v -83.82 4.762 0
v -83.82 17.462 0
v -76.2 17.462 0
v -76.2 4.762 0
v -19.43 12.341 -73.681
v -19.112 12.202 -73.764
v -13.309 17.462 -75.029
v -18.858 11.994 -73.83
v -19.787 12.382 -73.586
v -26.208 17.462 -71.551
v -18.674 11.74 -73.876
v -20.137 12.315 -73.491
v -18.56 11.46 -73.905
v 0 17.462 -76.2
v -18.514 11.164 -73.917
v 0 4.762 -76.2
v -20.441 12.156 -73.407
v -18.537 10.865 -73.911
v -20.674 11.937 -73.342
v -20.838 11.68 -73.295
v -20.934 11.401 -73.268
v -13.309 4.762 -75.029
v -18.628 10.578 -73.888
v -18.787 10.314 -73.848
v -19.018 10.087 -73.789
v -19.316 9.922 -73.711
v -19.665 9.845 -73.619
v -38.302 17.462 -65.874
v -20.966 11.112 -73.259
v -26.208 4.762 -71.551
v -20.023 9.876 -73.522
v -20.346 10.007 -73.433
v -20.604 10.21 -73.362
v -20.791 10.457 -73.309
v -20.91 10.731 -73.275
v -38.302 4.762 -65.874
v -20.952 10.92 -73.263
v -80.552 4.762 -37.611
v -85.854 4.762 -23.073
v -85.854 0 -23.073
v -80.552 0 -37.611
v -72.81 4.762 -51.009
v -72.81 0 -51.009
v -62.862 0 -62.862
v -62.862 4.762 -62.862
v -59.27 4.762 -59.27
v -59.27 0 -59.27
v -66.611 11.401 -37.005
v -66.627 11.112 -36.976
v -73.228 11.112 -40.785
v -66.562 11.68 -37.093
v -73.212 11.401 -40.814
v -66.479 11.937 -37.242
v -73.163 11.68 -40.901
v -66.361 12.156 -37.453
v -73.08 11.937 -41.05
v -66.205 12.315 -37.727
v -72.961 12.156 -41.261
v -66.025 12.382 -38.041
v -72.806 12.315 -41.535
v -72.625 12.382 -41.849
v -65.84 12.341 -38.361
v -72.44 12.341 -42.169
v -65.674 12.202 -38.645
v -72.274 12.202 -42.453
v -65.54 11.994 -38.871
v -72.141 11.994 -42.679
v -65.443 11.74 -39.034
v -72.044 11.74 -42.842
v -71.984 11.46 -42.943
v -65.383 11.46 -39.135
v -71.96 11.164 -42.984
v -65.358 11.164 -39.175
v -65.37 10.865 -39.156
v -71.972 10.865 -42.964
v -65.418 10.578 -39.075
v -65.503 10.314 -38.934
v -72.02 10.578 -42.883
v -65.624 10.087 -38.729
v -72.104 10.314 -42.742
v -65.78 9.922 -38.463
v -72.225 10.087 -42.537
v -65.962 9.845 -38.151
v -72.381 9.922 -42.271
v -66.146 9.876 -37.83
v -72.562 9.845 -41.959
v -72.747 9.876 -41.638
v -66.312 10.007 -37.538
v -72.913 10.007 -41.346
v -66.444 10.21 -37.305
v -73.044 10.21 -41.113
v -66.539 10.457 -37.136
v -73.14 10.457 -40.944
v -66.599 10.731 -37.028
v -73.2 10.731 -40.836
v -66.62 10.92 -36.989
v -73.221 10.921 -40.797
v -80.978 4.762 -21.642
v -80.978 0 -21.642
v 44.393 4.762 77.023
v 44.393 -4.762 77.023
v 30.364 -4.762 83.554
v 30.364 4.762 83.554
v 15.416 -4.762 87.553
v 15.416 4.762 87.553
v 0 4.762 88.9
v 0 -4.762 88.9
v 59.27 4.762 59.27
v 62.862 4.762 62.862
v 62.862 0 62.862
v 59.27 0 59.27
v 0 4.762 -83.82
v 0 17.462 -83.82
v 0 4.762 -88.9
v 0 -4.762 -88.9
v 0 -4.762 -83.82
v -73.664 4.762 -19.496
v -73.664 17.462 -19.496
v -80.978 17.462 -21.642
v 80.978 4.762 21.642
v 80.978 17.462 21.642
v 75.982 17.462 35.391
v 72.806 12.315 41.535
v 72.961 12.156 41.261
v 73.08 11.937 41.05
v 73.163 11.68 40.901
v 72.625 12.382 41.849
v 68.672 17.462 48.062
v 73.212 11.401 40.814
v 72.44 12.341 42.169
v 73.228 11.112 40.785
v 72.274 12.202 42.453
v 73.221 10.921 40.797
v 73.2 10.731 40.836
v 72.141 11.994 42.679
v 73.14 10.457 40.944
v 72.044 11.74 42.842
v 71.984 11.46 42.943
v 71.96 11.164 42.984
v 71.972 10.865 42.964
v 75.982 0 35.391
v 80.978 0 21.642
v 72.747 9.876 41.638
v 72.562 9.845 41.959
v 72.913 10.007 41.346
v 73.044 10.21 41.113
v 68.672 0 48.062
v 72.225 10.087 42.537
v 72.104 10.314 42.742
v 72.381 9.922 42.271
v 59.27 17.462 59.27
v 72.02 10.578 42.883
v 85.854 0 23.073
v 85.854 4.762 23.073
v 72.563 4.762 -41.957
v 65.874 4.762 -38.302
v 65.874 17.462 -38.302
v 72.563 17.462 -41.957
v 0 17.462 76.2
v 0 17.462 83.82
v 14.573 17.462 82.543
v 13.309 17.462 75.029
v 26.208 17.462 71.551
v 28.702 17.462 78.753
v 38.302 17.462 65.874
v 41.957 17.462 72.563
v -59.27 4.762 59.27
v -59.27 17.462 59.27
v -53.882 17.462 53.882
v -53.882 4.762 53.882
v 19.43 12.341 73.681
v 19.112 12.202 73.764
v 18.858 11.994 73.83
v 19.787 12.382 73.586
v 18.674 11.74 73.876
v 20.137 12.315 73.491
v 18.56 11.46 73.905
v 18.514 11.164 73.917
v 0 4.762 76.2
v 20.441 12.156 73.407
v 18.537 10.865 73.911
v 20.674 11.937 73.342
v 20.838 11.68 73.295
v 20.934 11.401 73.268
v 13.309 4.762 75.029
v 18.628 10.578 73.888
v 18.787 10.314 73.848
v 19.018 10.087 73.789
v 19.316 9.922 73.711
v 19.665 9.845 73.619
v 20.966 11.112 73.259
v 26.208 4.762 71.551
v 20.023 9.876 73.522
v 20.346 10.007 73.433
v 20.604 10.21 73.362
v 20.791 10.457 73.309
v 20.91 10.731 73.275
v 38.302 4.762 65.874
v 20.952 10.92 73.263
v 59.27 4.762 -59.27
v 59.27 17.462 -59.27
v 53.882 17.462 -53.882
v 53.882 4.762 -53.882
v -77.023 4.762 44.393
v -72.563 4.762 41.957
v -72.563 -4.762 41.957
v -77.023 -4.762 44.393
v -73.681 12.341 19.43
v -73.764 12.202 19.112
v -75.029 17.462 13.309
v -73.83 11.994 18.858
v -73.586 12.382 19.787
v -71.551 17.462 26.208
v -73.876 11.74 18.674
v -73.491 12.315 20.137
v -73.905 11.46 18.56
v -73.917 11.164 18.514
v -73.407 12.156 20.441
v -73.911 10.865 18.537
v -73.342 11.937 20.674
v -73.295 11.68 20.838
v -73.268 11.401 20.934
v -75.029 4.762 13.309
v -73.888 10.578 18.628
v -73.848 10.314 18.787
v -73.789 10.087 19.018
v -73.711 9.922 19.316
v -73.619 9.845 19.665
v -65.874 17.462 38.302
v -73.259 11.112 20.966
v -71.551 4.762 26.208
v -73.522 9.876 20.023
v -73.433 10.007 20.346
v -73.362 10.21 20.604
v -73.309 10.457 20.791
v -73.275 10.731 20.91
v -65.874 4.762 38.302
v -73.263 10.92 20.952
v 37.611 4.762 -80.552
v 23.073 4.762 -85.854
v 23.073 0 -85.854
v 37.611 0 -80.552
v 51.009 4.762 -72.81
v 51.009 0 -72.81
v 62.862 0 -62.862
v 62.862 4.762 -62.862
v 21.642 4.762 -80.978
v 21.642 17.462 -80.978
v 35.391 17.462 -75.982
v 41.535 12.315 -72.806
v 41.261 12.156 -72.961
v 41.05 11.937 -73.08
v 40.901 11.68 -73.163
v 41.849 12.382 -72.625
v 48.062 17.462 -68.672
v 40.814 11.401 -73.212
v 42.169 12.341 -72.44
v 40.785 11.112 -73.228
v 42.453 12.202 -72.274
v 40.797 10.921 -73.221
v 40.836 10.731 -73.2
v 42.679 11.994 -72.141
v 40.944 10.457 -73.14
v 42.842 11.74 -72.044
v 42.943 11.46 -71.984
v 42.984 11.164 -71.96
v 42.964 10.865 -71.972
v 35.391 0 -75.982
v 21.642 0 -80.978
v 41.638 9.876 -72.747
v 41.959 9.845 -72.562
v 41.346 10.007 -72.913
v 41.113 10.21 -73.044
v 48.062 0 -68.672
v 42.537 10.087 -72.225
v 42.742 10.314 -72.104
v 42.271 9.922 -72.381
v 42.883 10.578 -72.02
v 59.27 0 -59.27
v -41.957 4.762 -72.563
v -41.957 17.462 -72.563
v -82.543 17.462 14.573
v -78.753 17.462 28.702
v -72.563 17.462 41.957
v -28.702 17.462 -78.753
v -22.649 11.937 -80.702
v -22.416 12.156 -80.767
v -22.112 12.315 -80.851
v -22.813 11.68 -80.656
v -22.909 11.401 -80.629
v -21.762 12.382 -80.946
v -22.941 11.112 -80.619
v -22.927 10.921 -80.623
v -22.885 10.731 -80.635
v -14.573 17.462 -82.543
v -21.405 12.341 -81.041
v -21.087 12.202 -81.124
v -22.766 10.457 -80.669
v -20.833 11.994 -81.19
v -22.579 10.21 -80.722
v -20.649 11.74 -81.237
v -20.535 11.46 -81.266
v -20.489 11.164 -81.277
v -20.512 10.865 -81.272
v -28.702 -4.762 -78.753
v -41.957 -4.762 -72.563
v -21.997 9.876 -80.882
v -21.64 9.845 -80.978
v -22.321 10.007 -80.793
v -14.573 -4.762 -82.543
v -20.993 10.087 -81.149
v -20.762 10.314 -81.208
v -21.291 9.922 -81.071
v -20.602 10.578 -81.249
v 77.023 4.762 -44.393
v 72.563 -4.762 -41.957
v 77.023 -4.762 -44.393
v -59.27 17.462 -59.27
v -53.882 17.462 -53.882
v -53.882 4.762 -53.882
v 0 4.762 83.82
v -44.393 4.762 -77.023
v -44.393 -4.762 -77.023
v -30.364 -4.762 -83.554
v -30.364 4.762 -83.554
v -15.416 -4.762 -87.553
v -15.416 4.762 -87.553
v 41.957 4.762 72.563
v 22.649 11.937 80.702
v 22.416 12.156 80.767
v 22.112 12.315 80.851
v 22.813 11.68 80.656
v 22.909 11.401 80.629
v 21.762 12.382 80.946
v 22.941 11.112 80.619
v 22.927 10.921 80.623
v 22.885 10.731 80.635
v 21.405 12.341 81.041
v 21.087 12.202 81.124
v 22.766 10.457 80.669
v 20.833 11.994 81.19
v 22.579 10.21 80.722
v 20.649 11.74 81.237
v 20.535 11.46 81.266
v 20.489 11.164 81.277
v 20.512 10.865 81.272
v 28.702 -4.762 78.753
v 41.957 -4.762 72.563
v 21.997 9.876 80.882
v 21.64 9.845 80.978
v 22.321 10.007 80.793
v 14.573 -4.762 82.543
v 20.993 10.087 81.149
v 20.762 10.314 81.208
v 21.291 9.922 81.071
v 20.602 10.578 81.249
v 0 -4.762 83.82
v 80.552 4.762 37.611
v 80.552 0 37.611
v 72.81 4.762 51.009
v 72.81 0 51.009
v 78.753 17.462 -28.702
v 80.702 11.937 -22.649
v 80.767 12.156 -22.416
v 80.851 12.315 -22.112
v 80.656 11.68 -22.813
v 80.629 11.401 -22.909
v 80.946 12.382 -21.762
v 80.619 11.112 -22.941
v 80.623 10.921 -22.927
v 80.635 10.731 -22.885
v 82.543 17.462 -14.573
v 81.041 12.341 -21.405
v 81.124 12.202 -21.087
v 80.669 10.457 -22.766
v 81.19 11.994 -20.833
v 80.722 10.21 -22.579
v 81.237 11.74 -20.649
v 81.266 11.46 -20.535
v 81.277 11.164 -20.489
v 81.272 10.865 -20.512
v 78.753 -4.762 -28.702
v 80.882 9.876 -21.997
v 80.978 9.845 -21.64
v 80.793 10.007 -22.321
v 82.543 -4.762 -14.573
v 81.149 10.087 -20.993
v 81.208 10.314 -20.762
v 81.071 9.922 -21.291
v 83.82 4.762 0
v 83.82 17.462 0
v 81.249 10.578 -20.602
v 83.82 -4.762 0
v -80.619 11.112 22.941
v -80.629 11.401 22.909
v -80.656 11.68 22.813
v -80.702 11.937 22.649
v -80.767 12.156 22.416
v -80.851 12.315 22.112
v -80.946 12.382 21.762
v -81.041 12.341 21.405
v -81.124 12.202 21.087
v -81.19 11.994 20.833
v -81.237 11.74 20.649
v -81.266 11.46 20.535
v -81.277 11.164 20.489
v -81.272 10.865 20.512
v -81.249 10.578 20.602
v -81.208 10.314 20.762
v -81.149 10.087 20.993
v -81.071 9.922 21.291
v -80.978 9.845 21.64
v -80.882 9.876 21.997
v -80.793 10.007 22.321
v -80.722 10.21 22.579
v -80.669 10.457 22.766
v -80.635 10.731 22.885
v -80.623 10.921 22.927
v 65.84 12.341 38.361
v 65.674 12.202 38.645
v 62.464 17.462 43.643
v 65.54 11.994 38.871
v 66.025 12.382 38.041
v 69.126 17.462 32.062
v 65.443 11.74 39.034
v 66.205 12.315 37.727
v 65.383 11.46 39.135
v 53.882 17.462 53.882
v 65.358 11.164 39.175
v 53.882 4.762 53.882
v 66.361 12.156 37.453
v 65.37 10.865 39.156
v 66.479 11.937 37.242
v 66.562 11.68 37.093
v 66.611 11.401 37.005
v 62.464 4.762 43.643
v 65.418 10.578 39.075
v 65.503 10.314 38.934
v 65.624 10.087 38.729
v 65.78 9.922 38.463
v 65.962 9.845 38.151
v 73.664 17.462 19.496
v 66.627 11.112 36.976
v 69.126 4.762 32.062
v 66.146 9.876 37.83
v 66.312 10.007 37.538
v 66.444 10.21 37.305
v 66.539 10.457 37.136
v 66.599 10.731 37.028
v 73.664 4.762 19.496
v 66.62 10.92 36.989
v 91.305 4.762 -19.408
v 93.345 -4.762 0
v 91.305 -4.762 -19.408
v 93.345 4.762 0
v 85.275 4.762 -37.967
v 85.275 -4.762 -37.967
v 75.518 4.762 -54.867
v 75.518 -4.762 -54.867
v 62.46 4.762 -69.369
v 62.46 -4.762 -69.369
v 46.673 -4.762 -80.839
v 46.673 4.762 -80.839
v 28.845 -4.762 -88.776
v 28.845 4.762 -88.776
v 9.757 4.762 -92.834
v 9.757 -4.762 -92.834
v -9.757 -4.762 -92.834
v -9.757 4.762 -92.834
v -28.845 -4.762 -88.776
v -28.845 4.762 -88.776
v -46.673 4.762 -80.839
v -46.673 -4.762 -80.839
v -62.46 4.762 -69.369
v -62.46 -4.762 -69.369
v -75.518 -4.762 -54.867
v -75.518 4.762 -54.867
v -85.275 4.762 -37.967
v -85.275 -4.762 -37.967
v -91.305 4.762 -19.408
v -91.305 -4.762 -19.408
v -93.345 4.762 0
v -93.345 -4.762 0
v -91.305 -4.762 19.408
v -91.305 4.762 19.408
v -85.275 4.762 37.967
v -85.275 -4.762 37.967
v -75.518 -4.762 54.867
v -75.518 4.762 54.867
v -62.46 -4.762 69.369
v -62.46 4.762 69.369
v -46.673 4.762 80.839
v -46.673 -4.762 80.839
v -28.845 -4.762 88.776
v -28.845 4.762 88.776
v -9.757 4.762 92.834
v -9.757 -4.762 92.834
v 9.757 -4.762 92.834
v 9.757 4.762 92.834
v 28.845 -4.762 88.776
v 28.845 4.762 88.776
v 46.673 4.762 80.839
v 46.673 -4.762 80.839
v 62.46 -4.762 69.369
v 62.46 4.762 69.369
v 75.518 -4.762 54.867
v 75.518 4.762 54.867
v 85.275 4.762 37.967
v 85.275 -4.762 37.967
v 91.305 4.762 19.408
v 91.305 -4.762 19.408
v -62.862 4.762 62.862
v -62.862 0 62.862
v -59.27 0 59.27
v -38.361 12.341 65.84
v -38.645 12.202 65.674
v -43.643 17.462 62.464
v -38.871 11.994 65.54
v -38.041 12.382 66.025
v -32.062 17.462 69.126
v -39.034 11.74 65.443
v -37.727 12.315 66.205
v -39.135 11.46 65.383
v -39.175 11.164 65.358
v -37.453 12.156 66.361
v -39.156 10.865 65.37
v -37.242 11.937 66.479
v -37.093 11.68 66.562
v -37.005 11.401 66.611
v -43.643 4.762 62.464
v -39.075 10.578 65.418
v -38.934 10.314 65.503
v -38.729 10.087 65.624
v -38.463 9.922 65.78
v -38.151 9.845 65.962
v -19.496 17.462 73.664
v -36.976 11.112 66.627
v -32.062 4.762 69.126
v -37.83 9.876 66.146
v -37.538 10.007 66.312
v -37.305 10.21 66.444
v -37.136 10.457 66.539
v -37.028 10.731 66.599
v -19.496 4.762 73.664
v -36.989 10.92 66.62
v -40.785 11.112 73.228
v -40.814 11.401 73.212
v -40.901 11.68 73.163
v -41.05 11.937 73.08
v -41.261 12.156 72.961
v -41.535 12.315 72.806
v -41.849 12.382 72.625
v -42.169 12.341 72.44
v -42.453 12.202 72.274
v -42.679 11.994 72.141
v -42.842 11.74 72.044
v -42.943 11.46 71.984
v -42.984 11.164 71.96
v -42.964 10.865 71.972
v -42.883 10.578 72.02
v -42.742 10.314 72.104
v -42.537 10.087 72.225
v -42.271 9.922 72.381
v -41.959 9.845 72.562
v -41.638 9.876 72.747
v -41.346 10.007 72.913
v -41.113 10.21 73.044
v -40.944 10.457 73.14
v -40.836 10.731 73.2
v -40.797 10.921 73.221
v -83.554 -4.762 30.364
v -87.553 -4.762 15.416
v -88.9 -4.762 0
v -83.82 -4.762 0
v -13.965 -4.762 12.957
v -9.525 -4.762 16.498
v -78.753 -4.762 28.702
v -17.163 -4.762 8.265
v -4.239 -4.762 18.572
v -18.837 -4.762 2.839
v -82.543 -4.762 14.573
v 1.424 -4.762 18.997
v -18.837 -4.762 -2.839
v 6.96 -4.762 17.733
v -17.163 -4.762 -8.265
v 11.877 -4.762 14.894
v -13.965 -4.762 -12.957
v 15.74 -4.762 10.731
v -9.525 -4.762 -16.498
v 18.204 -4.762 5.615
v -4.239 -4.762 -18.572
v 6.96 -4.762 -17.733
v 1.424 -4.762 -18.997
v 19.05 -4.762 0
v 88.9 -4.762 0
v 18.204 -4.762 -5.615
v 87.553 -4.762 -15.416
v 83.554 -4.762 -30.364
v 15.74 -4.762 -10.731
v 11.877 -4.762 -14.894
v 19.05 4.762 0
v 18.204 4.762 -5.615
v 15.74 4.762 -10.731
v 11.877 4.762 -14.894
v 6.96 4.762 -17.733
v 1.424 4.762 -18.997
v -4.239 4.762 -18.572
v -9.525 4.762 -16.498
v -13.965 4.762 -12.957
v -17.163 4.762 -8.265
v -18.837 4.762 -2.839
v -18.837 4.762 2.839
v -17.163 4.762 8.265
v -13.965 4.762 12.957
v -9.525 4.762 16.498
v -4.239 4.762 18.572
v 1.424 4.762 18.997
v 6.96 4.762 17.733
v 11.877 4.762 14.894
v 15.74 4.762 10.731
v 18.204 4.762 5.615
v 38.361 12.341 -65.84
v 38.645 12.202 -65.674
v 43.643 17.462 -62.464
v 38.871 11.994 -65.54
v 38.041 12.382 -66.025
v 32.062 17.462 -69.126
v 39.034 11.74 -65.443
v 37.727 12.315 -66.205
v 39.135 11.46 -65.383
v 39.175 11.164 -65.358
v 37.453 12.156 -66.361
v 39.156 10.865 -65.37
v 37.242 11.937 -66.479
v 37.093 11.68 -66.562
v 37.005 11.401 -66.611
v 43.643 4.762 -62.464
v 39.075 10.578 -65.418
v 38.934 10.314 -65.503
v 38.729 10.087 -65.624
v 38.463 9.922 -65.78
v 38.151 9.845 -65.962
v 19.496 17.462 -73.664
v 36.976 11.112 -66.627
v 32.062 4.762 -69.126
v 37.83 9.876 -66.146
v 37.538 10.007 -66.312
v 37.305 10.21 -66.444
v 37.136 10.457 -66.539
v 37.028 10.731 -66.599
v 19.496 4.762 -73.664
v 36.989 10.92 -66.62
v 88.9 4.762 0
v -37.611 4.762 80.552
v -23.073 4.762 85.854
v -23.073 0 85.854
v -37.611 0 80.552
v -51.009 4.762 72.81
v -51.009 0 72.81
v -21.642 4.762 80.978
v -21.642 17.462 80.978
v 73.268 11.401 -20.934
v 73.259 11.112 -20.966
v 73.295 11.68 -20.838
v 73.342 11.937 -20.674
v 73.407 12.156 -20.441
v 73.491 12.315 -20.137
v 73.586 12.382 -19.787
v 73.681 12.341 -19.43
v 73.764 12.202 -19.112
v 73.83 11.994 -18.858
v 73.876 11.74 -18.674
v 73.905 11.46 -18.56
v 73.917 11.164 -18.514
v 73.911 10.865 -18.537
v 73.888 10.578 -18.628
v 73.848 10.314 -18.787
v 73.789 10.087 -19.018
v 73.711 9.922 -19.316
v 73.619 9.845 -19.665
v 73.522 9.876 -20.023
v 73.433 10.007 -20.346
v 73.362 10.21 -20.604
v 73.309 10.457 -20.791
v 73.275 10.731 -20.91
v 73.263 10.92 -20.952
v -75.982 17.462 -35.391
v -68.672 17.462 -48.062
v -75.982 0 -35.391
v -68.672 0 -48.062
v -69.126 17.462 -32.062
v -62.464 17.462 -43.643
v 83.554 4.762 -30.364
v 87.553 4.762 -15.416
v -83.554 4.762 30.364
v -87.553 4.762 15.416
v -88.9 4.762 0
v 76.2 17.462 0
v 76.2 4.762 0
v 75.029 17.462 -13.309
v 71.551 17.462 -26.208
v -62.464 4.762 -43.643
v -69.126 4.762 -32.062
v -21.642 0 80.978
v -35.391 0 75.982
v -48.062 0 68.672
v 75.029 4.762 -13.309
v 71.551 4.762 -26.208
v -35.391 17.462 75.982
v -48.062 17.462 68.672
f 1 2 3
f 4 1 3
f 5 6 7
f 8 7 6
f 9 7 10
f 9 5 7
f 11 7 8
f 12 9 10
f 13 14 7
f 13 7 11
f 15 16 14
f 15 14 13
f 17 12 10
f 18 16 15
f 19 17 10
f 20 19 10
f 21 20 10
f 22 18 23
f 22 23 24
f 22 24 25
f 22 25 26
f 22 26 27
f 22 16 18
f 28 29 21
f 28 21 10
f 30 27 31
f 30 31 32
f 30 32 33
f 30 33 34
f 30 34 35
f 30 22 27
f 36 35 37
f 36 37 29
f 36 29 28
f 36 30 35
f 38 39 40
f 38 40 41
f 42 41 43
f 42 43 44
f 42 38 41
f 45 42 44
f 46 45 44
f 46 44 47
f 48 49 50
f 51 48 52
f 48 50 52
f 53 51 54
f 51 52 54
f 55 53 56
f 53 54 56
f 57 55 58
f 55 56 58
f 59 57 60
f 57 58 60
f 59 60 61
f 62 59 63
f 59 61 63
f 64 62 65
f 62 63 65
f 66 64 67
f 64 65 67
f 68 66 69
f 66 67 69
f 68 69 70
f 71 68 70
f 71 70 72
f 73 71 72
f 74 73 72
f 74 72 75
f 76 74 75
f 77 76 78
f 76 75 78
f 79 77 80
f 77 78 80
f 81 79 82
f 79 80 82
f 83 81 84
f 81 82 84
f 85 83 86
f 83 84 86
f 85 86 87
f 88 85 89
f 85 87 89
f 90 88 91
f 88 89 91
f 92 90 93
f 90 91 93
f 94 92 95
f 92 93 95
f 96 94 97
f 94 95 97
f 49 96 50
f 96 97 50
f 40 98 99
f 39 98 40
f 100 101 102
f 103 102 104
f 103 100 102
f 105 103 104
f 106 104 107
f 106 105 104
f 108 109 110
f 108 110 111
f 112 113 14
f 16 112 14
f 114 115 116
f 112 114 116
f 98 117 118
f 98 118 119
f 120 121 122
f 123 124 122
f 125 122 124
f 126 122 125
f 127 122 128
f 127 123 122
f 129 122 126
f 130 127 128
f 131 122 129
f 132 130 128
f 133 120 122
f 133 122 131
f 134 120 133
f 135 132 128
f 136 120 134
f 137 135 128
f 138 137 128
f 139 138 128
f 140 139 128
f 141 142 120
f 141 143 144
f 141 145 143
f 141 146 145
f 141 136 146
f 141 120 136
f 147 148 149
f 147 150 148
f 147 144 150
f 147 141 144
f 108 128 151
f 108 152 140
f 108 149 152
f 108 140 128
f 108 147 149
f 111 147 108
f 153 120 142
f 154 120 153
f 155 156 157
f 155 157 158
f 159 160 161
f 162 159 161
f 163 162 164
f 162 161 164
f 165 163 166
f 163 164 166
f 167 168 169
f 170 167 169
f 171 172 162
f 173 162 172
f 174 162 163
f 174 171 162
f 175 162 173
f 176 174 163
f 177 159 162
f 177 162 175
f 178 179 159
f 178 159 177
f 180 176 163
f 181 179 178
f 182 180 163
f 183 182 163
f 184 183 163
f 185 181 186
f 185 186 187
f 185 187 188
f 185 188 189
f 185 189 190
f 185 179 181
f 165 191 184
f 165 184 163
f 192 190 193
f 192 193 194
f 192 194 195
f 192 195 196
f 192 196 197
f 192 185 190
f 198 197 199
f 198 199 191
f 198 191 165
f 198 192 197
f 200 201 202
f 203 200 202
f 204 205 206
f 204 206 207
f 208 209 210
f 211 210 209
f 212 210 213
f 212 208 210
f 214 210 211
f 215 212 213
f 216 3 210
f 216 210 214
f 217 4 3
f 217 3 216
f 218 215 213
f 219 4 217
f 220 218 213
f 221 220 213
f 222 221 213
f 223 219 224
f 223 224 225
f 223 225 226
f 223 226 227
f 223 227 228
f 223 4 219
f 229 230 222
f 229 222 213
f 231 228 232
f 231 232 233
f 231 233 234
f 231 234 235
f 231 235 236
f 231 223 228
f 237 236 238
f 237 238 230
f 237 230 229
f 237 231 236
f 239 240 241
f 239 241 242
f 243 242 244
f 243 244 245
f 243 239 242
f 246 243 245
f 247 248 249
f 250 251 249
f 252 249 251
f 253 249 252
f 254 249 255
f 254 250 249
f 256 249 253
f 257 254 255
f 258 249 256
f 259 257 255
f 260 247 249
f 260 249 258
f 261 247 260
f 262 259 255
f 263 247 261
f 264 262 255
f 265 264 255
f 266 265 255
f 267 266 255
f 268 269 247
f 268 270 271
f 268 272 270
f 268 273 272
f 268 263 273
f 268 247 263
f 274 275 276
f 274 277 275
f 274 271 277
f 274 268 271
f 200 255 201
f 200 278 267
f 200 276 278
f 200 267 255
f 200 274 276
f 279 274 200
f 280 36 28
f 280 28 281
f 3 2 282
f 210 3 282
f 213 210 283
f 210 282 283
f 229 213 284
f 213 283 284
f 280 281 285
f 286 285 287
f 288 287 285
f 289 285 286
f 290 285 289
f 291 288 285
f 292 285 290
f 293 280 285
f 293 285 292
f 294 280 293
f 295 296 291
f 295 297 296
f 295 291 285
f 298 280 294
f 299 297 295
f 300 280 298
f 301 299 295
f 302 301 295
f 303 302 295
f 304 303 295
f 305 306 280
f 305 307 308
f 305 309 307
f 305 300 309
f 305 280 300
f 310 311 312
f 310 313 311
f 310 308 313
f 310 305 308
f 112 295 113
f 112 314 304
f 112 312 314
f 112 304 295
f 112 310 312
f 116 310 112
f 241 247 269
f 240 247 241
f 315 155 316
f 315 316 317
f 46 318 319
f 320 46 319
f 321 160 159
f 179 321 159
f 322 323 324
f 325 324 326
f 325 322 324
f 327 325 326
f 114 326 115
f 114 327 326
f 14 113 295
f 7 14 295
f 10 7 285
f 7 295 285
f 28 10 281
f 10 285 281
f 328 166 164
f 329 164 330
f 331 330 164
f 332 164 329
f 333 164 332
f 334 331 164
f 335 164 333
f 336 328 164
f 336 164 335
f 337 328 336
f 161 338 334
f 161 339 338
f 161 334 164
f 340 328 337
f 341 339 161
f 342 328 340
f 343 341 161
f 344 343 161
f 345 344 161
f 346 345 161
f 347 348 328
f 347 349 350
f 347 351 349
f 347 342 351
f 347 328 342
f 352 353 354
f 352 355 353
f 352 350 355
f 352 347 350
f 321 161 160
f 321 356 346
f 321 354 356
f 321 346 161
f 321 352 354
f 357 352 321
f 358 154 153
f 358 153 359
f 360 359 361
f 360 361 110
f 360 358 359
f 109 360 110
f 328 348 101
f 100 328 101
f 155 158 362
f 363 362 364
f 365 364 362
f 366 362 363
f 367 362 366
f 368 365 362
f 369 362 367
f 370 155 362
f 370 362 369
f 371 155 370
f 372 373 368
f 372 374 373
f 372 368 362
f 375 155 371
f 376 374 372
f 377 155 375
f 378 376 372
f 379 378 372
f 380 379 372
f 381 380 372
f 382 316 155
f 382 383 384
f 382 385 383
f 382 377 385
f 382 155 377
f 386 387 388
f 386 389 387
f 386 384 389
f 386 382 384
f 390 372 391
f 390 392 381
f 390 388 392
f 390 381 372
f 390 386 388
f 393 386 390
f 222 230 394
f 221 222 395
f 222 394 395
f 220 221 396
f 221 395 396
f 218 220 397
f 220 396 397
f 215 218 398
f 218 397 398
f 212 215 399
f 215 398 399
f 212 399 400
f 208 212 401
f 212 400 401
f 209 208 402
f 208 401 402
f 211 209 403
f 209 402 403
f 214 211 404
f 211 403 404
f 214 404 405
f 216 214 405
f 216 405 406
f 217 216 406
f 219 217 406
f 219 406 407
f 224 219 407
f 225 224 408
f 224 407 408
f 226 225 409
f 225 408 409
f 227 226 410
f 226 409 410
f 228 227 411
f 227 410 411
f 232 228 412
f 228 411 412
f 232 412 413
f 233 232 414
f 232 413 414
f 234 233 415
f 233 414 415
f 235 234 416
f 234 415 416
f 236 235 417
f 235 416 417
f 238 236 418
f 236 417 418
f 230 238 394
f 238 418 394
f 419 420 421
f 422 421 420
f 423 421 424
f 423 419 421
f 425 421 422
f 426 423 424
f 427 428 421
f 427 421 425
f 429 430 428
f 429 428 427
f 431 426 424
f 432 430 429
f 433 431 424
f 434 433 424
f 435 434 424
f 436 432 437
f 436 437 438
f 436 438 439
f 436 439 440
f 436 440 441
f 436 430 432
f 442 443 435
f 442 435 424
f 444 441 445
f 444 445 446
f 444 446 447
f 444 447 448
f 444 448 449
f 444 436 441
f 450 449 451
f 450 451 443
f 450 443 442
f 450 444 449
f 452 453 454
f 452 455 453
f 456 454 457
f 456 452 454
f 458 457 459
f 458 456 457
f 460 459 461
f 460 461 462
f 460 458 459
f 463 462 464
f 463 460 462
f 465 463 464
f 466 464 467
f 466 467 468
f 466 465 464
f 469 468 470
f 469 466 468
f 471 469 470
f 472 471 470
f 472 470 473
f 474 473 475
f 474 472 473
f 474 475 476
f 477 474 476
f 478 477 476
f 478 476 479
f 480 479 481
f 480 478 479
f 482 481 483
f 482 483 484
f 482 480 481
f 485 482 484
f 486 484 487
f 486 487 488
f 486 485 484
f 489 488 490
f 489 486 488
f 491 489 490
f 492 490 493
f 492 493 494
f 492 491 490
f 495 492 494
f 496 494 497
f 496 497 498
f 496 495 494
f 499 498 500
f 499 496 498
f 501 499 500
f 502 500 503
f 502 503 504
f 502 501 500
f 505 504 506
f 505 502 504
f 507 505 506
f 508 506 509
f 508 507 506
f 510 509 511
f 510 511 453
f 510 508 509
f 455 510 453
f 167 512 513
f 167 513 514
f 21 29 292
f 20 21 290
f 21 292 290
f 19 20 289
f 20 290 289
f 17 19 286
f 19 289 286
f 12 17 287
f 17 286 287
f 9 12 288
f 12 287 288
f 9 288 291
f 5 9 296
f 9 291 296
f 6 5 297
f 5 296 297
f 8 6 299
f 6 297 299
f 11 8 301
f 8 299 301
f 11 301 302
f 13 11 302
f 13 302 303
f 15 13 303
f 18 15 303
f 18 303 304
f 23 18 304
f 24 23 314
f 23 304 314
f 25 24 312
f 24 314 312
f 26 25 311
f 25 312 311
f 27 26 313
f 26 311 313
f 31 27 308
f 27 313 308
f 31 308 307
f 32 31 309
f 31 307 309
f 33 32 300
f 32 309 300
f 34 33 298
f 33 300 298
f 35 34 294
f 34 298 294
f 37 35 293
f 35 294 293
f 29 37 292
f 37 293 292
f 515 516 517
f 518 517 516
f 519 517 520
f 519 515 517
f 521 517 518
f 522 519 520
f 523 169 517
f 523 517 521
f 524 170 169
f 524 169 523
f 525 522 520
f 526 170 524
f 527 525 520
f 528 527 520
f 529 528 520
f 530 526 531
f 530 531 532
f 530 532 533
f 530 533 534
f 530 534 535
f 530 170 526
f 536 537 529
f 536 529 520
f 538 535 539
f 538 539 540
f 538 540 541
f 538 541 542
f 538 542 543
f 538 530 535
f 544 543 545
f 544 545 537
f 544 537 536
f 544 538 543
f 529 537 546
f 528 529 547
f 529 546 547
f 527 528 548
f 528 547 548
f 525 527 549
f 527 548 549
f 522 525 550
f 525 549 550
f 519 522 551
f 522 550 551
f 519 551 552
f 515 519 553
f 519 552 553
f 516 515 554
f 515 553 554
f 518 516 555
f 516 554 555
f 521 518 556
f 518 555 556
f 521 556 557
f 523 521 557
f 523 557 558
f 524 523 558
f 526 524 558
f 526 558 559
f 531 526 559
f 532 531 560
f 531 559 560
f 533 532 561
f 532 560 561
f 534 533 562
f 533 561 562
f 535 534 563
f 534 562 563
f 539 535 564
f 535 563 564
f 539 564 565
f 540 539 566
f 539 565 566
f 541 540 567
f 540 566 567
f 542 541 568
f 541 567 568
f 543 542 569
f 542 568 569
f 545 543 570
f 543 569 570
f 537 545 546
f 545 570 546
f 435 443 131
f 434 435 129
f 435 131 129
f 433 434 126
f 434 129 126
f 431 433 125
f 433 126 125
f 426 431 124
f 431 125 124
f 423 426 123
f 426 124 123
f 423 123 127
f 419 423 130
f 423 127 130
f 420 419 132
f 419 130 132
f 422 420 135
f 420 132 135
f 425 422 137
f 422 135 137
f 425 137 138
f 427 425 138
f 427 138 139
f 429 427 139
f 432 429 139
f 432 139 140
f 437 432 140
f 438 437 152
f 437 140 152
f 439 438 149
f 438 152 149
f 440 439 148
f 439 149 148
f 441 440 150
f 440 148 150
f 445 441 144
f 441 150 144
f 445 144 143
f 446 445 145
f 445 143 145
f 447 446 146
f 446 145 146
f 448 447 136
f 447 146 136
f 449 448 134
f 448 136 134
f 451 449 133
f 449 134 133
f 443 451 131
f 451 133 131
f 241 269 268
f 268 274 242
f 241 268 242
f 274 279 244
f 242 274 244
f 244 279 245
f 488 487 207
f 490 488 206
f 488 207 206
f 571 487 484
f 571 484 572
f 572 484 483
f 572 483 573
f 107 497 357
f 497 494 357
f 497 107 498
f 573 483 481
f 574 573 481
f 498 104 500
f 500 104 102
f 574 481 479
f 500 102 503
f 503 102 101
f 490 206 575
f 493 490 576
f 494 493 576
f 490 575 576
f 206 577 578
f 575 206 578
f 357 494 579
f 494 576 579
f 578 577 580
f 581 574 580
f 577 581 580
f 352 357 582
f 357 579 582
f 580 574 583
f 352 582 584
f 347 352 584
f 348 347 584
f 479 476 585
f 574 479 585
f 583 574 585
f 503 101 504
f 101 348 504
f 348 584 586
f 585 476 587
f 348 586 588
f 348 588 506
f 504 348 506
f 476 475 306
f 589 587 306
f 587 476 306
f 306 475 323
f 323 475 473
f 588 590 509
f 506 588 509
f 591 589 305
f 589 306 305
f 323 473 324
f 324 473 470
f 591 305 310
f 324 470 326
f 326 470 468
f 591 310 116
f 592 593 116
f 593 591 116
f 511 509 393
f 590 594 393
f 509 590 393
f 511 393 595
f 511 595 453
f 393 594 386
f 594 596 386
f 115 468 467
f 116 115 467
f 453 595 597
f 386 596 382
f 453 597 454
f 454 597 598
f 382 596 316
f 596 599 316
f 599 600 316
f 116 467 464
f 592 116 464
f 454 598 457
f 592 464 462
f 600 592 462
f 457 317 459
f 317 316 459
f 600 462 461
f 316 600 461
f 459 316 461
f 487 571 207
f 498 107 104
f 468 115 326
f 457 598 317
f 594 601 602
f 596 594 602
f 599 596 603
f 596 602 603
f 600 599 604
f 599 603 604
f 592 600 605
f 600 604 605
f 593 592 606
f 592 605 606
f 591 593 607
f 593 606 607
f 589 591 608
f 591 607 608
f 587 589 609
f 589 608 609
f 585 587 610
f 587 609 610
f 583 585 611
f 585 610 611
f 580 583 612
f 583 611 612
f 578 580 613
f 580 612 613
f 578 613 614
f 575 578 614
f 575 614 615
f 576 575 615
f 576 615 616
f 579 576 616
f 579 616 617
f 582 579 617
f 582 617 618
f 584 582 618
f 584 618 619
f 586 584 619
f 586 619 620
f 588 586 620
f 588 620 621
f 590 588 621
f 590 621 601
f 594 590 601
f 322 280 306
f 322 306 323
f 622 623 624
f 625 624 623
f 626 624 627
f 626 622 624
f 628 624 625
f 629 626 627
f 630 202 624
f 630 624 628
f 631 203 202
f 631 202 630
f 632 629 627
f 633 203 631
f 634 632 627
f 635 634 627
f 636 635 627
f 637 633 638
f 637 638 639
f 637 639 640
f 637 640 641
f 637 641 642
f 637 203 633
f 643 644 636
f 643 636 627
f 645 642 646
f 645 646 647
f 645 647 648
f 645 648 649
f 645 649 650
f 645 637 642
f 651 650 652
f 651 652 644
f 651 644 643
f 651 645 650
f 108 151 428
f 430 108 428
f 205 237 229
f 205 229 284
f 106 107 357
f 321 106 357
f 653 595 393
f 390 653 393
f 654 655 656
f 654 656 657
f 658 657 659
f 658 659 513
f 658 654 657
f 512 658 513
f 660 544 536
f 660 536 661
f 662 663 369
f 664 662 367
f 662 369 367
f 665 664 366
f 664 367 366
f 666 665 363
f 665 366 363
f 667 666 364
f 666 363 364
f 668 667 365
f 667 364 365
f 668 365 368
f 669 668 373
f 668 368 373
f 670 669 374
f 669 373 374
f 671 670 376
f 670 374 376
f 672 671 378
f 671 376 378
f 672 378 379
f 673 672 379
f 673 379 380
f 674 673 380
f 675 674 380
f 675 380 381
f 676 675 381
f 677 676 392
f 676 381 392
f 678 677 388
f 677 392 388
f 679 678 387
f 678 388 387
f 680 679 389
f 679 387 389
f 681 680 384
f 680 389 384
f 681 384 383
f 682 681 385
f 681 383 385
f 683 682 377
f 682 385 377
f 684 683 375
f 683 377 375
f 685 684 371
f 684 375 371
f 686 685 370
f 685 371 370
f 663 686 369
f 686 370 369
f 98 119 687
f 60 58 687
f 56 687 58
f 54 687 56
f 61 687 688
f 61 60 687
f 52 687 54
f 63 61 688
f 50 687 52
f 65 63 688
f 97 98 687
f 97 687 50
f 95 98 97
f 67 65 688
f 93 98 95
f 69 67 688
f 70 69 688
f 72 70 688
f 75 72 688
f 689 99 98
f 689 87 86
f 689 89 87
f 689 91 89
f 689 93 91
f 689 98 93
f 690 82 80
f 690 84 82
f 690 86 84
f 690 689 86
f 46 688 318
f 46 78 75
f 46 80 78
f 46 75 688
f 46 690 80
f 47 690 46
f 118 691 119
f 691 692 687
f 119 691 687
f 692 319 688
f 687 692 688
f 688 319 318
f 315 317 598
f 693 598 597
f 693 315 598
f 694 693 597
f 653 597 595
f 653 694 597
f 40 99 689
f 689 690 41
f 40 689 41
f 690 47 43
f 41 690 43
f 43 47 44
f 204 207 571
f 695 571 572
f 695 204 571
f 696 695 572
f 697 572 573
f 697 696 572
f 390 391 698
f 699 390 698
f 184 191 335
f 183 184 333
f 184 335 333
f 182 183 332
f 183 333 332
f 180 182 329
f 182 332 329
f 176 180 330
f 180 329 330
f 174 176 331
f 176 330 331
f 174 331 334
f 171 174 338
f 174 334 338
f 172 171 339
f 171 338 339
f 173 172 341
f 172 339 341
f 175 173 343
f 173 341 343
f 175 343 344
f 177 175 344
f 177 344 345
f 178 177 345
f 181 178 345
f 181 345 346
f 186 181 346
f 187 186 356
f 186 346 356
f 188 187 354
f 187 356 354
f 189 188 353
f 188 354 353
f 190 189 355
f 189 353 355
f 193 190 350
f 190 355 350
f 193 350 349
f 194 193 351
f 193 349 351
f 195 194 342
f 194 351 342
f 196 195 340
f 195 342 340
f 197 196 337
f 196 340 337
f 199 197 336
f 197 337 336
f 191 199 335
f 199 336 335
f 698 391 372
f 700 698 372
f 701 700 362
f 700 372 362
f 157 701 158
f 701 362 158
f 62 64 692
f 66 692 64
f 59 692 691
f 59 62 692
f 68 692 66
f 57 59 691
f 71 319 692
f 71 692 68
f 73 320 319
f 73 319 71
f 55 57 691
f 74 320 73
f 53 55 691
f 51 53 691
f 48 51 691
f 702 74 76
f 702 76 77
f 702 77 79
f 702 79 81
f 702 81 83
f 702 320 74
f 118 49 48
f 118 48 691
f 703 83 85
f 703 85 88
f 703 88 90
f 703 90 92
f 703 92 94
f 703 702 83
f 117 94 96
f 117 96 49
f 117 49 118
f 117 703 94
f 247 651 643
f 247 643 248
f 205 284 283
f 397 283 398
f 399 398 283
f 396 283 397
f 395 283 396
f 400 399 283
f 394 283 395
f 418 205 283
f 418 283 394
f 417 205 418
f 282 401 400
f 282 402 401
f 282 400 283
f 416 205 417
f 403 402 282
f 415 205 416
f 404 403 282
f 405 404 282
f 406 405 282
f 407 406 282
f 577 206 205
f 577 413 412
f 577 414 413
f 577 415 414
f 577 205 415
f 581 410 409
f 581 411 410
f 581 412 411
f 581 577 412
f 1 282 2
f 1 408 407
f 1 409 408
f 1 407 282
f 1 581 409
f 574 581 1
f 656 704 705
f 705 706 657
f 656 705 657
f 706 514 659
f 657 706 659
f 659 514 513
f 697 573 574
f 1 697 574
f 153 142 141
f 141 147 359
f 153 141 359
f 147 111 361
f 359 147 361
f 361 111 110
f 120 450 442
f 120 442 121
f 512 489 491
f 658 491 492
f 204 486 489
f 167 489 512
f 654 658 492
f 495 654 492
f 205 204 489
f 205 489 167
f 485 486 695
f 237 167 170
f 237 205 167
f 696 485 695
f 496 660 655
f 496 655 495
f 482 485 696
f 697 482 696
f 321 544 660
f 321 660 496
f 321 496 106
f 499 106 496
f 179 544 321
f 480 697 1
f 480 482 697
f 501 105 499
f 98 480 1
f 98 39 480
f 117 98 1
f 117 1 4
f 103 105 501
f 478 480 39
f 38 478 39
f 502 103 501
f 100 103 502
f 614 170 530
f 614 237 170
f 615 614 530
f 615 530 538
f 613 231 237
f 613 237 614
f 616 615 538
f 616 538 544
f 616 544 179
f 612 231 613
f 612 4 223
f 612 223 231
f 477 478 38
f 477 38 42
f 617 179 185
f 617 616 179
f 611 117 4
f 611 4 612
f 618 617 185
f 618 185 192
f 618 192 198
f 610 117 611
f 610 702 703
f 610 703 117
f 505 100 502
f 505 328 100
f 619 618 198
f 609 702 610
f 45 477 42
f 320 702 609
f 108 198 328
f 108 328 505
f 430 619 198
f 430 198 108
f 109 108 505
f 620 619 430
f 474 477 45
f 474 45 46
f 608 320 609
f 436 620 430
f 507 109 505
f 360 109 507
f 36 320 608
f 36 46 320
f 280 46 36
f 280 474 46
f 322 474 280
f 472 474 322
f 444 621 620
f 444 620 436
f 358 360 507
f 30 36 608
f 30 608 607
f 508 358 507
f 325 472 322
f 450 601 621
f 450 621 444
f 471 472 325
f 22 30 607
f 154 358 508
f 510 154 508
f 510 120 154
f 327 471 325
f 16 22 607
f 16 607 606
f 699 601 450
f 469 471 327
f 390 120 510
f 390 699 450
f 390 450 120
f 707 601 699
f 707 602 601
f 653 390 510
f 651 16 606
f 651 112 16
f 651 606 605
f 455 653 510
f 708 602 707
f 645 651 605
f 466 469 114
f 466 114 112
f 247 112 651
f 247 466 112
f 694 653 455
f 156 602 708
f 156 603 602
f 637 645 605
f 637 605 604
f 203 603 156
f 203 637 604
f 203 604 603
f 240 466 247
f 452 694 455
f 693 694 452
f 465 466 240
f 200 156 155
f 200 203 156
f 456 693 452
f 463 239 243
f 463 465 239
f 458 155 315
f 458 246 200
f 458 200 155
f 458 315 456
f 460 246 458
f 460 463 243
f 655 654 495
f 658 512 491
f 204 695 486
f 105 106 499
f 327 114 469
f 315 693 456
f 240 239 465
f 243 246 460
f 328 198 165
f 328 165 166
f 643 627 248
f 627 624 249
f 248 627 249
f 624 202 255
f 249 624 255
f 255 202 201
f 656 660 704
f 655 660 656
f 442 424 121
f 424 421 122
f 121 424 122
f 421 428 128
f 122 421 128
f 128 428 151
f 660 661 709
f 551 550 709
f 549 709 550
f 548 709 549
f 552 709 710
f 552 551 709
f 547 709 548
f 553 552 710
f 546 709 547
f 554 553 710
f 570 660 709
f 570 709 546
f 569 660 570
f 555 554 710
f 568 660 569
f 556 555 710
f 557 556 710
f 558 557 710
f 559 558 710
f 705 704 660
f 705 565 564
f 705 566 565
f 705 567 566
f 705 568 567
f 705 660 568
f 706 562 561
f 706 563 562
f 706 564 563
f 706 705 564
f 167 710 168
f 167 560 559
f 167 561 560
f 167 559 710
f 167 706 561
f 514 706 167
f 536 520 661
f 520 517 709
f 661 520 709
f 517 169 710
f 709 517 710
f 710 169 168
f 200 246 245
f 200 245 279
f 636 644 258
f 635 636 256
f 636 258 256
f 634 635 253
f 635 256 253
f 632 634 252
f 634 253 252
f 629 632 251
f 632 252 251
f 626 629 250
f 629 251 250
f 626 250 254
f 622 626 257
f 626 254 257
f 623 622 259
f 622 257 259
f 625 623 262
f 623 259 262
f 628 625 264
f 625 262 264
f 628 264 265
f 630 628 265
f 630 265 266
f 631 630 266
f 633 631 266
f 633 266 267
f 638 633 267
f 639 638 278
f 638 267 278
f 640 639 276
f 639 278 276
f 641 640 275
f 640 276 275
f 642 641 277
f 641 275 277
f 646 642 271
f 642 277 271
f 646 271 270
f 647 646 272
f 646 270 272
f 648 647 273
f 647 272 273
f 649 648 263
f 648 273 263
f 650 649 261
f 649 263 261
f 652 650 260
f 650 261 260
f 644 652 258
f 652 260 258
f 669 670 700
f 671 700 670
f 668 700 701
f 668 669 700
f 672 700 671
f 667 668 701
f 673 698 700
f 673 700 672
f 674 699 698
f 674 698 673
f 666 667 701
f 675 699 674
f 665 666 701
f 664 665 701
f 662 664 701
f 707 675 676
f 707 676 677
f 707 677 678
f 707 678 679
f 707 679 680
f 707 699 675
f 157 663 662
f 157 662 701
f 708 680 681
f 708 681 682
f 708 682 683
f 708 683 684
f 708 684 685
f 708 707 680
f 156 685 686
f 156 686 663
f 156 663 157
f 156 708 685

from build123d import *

# Parameters (mm, degrees)
BASE_DEPTH                 = 4.7625
BASE_DEPTH_BACK            = 4.7625
SKETCH1_R                  = 93.345
BOTTOM_SUPPORT_HOLES_DEPTH = 133.352951138
BOTTOM_START               = 12.7
BOTTOM_SUPPORT_GUIDE_DEPTH = 12.7
SKETCH6_R                  = 1.27
BOTTOM_BOLT_HOLE_DEPTH     = 12.7
TOP_SUPPORT_HOLES_DEPTH    = 4.7625
TOP_START                  = 12.7
TOP_SUPPORT_GUIDE_DEPTH    = 12.7
SKETCH12_R                 = 1.27
TOP_BOLT_HOLE_DEPTH        = 12.7
BOTTOM_PATTERN_COUNT       = 4
CIRPATTERN3_COUNT          = 4
SKETCH13_R                 = 19.05
GIMBAL_HOLE_DEPTH          = 25.908


with BuildPart() as part:
    # Sketch1 → Base (new, two sides: drawn at the far end of the back side and taken through both)
    with BuildSketch(Plane(origin=(0, 0, 0), x_dir=(1, 0, 0), z_dir=(0, 1, 0)).offset(-BASE_DEPTH_BACK)):
        Circle(SKETCH1_R)
    extrude(amount=BASE_DEPTH + BASE_DEPTH_BACK)

    # Sketch2 → Bottom support holes (cut, through all)
    with BuildSketch(Plane(origin=(0, 4.7625, 0), x_dir=(1, 0, 0), z_dir=(0, 1, 0))):
        with BuildLine():
            Line((0, 88.9), (0, 83.82))
            ThreePointArc((0, 83.82), (-21.72026739, 80.956916842), (-41.956713931, 72.563258996))
            Line((-41.956713931, 72.563258996), (-44.39288973, 77.022602796))
            ThreePointArc((-44.39288973, 77.022602796), (-22.977169228, 85.879332172), (0, 88.9))
        make_face()
    bottom_support_holes = extrude(amount=-BOTTOM_SUPPORT_HOLES_DEPTH, mode=Mode.SUBTRACT)

    # Sketch3 → Bottom support guide (add)
    with BuildSketch(Plane(origin=(0, 4.7625, 0), x_dir=(1, 0, 0), z_dir=(0, 1, 0)).offset(BOTTOM_START)):
        with BuildLine():
            Line((0, 83.82), (0, 76.2))
            ThreePointArc((0, 76.2), (-19.834896001, 73.573207764), (-38.302281481, 65.8739344))
            Line((-38.302281481, 65.8739344), (-41.956713931, 72.563258996))
            ThreePointArc((-41.956713931, 72.563258996), (-21.72026739, 80.956916842), (0, 83.82))
        make_face()
    bottom_support_guide = extrude(amount=-BOTTOM_SUPPORT_GUIDE_DEPTH)

    # Sketch6 → Bottom bolt hole (cut, symmetric)
    with BuildSketch(Plane(origin=(-20.978356966, 0, -78.191629498), x_dir=(-0.9658424820058785, 0, 0.2591298901183038), z_dir=(-0.2591298901183038, 0, -0.9658424820058785))):
        with Locations((-0.00326739, 11.1125)):
            Circle(SKETCH6_R)
    bottom_bolt_hole = extrude(amount=BOTTOM_BOLT_HOLE_DEPTH, both=True, mode=Mode.SUBTRACT)

    # Sketch8 → Top support holes (cut)
    with BuildSketch(Plane(origin=(-31.122978549, 4.7625, 77.296707326), x_dir=(1, 0, 0), z_dir=(0, 1, 0))):
        with BuildLine():
            Line((-31.738814298, 140.158500173), (-28.14671185, 136.566397725))
            ThreePointArc((-28.14671185, 136.566397725), (-41.480754694, 119.183343848), (-49.854870889, 98.93880289))
            Line((-49.854870889, 98.93880289), (-54.730739557, 100.369398703))
            ThreePointArc((-54.730739557, 100.369398703), (-45.850191767, 121.775253295), (-31.738814298, 140.158500173))
        make_face()
    top_support_holes = extrude(amount=-TOP_SUPPORT_HOLES_DEPTH, mode=Mode.SUBTRACT)

    # Sketch10 → Top support guide (add)
    with BuildSketch(Plane(origin=(-31.122978549, 4.7625, 77.296707326), x_dir=(1, 0, 0), z_dir=(0, 1, 0)).offset(TOP_START)):
        with BuildLine():
            Line((-28.14671185, 136.566397725), (-22.758558177, 131.178244052))
            ThreePointArc((-22.758558177, 131.178244052), (-34.92652504, 115.295431983), (-42.540730139, 96.792810073))
            Line((-42.540730139, 96.792810073), (-49.854870889, 98.93880289))
            ThreePointArc((-49.854870889, 98.93880289), (-41.480754694, 119.183343848), (-28.14671185, 136.566397725))
        make_face()
    top_support_guide = extrude(amount=-TOP_SUPPORT_GUIDE_DEPTH)

    # Sketch12 → Top bolt hole (cut, symmetric)
    with BuildSketch(Plane(origin=(-70.123769919, 0, -40.455892982), x_dir=(-0.4997212660736201, -5.817861610189737e-15, 0.8661862710951832), z_dir=(-0.8661862710951832, 1.404556040332972e-14, -0.4997212660736201))):
        with Locations((-0.00326739, 11.1125)):
            Circle(SKETCH12_R)
    top_bolt_hole = extrude(amount=TOP_BOLT_HOLE_DEPTH, both=True, mode=Mode.SUBTRACT)

    # Bottom pattern: Bottom support holes, Bottom support guide, Bottom bolt hole ×4 about axis
    bottom_pattern_axis = Axis((0, 4.7625, 0), (0, 1, 0))
    add([bottom_support_holes.rotate(bottom_pattern_axis, i * 360 / BOTTOM_PATTERN_COUNT) for i in range(1, BOTTOM_PATTERN_COUNT)], mode=Mode.SUBTRACT)
    add([bottom_support_guide.rotate(bottom_pattern_axis, i * 360 / BOTTOM_PATTERN_COUNT) for i in range(1, BOTTOM_PATTERN_COUNT)])
    add([bottom_bolt_hole.rotate(bottom_pattern_axis, i * 360 / BOTTOM_PATTERN_COUNT) for i in range(1, BOTTOM_PATTERN_COUNT)], mode=Mode.SUBTRACT)

    # CirPattern3: Top support holes, Top support guide, Top bolt hole ×4 about axis
    cirpattern3_axis = Axis((0, 4.7625, 0), (0, 1, 0))
    add([top_support_holes.rotate(cirpattern3_axis, i * 360 / CIRPATTERN3_COUNT) for i in range(1, CIRPATTERN3_COUNT)], mode=Mode.SUBTRACT)
    add([top_support_guide.rotate(cirpattern3_axis, i * 360 / CIRPATTERN3_COUNT) for i in range(1, CIRPATTERN3_COUNT)])
    add([top_bolt_hole.rotate(cirpattern3_axis, i * 360 / CIRPATTERN3_COUNT) for i in range(1, CIRPATTERN3_COUNT)], mode=Mode.SUBTRACT)

    # Sketch13 → Gimbal Hole (cut)
    with BuildSketch(Plane(origin=(0, 4.7625, 0), x_dir=(1, 0, 0), z_dir=(0, 1, 0))):
        Circle(SKETCH13_R)
    extrude(amount=-GIMBAL_HOLE_DEPTH, mode=Mode.SUBTRACT)


solid = part.part
